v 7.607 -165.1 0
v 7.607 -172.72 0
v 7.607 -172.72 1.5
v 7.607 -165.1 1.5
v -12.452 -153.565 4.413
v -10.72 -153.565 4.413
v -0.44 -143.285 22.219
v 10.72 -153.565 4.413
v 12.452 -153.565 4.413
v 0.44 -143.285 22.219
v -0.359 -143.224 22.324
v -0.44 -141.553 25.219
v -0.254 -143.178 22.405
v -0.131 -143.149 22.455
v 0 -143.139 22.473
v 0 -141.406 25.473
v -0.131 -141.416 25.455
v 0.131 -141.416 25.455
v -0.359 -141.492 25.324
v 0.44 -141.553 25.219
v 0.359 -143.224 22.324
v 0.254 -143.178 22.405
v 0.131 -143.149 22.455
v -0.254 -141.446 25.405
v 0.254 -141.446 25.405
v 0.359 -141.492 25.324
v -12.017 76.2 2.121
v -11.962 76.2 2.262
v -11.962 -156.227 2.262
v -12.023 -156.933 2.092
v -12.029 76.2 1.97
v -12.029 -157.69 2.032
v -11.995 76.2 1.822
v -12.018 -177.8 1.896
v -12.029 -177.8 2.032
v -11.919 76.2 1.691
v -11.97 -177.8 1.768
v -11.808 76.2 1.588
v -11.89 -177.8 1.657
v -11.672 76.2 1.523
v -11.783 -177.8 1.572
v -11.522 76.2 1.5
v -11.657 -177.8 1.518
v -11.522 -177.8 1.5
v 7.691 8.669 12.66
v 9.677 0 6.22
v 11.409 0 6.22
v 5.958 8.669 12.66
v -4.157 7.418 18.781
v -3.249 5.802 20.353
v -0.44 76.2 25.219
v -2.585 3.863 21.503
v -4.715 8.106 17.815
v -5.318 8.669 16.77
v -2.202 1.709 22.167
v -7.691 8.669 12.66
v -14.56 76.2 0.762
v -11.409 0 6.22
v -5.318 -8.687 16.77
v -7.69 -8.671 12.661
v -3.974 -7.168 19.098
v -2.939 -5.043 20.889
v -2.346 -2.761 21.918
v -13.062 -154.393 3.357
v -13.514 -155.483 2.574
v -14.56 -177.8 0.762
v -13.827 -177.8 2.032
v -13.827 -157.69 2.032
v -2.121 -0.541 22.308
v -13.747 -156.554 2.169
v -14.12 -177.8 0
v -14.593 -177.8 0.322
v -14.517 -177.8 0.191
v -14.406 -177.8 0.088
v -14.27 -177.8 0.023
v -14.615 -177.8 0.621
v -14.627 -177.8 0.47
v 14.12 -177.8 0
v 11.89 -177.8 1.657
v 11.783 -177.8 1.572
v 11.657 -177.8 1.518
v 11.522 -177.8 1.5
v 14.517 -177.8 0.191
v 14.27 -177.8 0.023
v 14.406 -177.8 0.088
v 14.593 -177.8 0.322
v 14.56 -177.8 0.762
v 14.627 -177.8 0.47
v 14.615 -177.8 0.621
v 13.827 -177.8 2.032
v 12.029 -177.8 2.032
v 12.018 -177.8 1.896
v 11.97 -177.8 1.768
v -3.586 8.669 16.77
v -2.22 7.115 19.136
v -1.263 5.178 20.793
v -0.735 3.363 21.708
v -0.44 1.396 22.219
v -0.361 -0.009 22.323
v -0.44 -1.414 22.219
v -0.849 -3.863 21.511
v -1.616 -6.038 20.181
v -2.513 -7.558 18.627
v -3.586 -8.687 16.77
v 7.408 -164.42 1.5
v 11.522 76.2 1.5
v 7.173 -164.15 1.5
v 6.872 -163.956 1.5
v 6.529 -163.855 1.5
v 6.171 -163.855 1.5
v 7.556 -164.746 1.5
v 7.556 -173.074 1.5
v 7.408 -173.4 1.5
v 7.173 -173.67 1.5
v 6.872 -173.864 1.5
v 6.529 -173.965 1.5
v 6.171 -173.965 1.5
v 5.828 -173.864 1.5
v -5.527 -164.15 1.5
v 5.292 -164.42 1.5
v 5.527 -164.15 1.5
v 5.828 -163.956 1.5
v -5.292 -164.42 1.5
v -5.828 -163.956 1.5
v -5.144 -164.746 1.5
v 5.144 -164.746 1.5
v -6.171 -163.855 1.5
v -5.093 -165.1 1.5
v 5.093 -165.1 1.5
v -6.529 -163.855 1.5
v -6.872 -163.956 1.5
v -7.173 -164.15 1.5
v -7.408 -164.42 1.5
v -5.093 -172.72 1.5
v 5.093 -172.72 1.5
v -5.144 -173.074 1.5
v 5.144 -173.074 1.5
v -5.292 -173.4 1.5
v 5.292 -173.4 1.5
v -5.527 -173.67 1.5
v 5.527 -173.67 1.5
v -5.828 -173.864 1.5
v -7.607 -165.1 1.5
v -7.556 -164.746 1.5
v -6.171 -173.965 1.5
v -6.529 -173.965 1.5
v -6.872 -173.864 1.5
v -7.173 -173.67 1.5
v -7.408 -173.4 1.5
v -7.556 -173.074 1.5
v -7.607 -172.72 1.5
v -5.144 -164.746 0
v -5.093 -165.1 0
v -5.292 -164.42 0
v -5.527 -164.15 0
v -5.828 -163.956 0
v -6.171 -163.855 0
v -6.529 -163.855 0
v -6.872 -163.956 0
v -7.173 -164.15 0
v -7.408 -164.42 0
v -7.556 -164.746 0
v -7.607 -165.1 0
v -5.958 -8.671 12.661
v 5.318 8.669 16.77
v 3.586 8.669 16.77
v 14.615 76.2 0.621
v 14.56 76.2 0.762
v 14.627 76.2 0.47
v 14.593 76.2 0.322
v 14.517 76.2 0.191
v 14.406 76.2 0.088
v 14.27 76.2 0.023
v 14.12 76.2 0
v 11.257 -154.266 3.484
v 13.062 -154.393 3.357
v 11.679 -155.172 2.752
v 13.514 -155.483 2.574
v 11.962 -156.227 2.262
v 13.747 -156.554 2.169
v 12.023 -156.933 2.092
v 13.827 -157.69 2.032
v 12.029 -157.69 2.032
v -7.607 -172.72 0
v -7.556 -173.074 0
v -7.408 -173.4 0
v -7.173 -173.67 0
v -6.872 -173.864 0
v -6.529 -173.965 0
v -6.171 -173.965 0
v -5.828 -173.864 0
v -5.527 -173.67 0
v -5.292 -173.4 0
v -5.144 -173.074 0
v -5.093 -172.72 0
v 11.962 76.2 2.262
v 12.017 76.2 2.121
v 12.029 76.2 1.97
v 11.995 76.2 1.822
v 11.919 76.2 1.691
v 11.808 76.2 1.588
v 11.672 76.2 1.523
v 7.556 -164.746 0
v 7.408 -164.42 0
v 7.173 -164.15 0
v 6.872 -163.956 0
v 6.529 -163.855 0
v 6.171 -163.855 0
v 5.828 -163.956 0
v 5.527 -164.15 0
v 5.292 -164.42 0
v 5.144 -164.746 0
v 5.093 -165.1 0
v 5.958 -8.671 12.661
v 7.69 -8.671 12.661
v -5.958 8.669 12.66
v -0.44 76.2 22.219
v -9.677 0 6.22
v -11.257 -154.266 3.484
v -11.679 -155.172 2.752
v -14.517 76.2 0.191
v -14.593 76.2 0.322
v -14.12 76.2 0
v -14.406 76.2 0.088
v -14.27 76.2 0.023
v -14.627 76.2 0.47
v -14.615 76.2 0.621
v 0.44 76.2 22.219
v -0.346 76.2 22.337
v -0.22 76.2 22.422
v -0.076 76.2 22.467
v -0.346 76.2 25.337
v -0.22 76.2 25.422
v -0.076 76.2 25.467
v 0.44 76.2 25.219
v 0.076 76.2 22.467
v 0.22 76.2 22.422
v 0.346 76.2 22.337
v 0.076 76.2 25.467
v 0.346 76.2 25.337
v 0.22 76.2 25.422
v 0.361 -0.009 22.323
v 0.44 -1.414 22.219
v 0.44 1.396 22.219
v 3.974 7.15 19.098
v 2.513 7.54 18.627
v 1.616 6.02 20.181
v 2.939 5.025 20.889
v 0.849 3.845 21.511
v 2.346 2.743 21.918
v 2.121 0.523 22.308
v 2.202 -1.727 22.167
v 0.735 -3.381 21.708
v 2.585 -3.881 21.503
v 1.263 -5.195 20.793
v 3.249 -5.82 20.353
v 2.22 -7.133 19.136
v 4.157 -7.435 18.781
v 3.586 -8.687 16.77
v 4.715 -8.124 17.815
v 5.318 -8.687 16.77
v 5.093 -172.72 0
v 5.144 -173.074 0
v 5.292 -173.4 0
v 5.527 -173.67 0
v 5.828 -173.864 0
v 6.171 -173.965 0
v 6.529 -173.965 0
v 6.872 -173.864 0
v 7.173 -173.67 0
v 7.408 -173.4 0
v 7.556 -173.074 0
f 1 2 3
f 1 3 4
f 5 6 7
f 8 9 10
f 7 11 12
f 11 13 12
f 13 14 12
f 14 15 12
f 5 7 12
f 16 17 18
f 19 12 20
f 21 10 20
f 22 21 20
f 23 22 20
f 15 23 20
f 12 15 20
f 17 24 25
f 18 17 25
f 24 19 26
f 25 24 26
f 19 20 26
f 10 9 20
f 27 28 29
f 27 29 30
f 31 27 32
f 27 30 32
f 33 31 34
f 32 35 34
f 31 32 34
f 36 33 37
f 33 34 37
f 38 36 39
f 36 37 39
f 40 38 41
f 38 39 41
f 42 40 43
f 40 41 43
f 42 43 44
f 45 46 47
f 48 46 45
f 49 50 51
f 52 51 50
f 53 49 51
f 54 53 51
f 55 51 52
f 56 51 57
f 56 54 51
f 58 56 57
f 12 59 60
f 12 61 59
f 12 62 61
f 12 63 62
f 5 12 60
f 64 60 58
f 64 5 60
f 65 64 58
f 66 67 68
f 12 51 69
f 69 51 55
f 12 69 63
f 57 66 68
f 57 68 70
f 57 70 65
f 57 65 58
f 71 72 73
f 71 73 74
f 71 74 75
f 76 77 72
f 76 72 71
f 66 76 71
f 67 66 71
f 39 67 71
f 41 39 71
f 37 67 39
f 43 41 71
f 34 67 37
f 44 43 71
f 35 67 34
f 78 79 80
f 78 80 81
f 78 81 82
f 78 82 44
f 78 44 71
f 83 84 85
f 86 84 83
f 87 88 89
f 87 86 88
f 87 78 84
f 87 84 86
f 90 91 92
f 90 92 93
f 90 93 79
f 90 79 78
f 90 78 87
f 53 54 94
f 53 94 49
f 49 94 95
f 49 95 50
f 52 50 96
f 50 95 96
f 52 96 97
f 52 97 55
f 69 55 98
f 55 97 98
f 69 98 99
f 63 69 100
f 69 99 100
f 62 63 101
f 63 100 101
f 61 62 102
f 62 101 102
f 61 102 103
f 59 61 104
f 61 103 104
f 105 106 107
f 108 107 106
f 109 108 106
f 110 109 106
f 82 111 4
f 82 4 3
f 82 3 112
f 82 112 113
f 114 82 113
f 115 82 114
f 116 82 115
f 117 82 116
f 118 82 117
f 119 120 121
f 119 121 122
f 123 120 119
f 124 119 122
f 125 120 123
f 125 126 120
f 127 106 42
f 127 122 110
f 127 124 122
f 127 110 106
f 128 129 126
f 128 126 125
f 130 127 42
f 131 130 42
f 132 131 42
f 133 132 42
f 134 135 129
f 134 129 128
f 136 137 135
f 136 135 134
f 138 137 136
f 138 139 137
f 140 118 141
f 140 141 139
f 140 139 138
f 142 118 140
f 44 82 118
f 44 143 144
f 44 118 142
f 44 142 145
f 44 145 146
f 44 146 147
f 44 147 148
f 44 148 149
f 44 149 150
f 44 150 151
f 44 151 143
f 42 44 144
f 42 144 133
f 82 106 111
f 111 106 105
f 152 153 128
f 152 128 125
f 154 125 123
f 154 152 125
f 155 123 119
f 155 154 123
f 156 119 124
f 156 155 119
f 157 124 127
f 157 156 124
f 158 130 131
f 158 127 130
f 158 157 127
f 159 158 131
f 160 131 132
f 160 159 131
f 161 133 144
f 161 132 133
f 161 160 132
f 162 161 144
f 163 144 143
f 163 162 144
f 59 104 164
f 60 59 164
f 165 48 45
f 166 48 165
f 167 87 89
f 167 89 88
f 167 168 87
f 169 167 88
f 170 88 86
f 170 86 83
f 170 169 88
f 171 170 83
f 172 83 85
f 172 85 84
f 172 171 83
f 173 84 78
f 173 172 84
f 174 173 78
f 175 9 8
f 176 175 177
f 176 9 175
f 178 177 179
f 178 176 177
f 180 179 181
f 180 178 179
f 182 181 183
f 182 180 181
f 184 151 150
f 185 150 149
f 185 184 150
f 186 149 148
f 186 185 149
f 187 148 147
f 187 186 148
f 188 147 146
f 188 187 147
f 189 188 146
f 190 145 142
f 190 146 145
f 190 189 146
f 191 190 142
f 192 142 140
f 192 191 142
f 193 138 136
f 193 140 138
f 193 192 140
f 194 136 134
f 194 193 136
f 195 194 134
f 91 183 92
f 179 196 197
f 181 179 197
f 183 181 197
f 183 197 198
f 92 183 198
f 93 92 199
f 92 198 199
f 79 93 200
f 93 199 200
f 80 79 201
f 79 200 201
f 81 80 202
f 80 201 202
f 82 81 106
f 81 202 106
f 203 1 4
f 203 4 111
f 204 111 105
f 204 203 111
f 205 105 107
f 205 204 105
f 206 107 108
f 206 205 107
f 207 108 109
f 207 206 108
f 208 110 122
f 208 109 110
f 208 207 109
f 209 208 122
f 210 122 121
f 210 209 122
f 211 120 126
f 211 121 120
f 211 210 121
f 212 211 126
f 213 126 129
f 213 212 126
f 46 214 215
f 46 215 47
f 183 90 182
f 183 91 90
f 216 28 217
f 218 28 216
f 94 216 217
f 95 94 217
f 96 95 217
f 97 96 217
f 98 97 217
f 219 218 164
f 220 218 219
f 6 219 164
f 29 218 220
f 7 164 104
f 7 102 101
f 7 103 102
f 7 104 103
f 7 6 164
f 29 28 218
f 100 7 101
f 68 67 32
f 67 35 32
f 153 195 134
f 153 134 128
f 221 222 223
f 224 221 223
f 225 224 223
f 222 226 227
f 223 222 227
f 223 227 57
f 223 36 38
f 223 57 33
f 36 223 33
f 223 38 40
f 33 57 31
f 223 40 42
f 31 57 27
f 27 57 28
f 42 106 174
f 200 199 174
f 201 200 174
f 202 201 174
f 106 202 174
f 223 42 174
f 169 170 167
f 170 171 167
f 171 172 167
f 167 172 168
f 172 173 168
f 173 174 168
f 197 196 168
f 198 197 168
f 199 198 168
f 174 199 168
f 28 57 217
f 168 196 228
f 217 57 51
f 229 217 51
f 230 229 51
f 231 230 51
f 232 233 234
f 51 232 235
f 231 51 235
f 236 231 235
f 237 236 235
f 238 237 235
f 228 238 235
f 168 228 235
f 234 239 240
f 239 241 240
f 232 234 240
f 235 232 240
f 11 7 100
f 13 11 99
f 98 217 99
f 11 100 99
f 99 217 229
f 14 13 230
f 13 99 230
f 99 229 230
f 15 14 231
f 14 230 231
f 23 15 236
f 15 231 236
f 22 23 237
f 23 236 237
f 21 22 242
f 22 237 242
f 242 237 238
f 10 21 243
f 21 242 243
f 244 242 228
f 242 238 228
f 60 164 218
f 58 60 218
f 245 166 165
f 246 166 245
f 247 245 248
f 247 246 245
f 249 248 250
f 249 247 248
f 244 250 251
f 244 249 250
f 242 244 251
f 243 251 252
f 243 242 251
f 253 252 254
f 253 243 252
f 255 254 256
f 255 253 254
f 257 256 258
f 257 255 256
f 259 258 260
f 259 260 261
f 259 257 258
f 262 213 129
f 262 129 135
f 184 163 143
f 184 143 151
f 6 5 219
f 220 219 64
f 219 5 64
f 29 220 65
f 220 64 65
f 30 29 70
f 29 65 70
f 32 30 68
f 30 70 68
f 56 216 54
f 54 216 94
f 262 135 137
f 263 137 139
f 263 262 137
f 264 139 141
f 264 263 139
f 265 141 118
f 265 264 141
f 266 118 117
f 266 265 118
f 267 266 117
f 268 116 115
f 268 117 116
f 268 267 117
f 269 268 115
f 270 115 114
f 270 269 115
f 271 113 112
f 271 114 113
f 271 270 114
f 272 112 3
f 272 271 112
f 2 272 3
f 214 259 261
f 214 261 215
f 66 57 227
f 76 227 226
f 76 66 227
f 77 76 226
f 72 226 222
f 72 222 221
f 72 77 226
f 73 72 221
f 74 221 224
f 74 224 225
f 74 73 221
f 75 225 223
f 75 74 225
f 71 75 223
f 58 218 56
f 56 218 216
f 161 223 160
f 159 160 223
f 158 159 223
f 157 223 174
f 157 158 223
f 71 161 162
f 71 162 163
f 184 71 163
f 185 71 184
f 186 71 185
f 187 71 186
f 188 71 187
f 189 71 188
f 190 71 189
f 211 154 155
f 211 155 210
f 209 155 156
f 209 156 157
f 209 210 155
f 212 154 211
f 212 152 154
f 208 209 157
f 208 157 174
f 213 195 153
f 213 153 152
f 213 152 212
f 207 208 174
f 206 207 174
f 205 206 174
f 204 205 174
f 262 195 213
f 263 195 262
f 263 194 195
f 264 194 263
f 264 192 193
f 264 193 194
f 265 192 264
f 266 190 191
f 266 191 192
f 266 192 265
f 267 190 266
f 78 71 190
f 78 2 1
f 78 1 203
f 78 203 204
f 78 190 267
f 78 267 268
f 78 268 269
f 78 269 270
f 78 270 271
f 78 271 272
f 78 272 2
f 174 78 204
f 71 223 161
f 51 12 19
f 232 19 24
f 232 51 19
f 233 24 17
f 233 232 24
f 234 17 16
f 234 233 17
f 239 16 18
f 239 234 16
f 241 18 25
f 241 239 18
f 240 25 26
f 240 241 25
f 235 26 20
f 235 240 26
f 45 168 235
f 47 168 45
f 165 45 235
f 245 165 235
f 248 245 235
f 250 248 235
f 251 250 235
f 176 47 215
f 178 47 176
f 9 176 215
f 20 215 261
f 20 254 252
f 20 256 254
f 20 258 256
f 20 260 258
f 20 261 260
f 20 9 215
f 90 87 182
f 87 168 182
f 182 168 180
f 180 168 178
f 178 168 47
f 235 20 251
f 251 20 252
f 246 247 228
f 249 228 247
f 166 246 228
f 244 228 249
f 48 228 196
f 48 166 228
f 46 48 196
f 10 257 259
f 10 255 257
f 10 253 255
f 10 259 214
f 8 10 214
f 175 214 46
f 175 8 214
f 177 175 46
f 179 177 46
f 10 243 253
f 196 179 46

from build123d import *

# Parameters (mm, degrees)
F1_DEPTH      = 177.8
F1_DEPTH_BACK = 76.2
F2_R          = 0.508
F4_DEPTH      = 14.6291181898
F4_DEPTH_BACK = 14.6291181898
F6_DEPTH      = 25.4737621135
F8_DEPTH      = 14.6291181898
F8_DEPTH_BACK = 14.6291181898
F9_R          = 4.7625


with BuildPart() as f1:
    # F0 (on Front) → F1 (new body, two sides)
    with BuildSketch(Plane.XZ) as f1_sk:
        Polygon((0, 25.9807621135), (-15, 0), (15, 0), align=None)
        Polygon((-12.4019237886, 1.5), (0, 22.9807621135), (12.4019237886, 1.5), align=None, mode=Mode.SUBTRACT)
    extrude(amount=F1_DEPTH)
    extrude(f1_sk.sketch, amount=-F1_DEPTH_BACK)

    # F2
    f2_edges = [f1.edges().sort_by_distance(p)[0] for p in [
        (0, -50.8, 25.980762),
        (15, -50.8, 0),
        (-15, -50.8, 0),
        (-12.401924, -50.8, 1.5),
        (0, -50.8, 22.980762),
        (12.401924, -50.8, 1.5),
    ]]
    fillet(f2_edges, radius=F2_R)

    # F3 (on Right) → F4 (cut, two sides)
    with BuildSketch(Plane.YZ) as f4_sk:
        with BuildLine():
            Line((-8.6871078238, 16.7701914907), (-8.6706578732, 12.6613909379))
            Line((-8.6706578732, 12.6613909379), (0, 6.2201358425))
            Line((0, 6.2201358425), (8.6693109221, 12.6603903153))
            Line((8.6693109221, 12.6603903153), (8.6693109221, 16.7701914907))
            ThreePointArc((8.6693109221, 16.7701914907), (-0.0088984509, 22.3225436807), (-8.6871078238, 16.7701914907))
        make_face()
    extrude(amount=-F4_DEPTH, mode=Mode.SUBTRACT)
    extrude(f4_sk.sketch, amount=F4_DEPTH_BACK, mode=Mode.SUBTRACT)

    # F5 (on Top) → F6 (cut, through all)
    with BuildSketch(Plane.XY):
        with BuildLine():
            Line((-5.0927, -172.72), (-5.0927, -165.1))
            ThreePointArc((-5.0927, -165.1), (-6.35, -163.8427), (-7.6073, -165.1))
            Line((-7.6073, -165.1), (-7.6073, -172.72))
            ThreePointArc((-7.6073, -172.72), (-6.35, -173.9773), (-5.0927, -172.72))
        make_face()
        with BuildLine():
            ThreePointArc((7.6073, -165.1), (6.35, -163.8427), (5.0927, -165.1))
            Line((5.0927, -165.1), (5.0927, -172.72))
            ThreePointArc((5.0927, -172.72), (6.35, -173.9773), (7.6073, -172.72))
            Line((7.6073, -172.72), (7.6073, -165.1))
        make_face()
    extrude(amount=F6_DEPTH, mode=Mode.SUBTRACT)

    # F7 (on Right) → F8 (cut, two sides)
    with BuildSketch(Plane.YZ) as f8_sk:
        Polygon((-204.1564583778, 33.782), (-205.74, 2.032), (-154.94, 2.032), (-136.6091289532, 33.782), align=None)
    extrude(amount=-F8_DEPTH, mode=Mode.SUBTRACT)
    extrude(f8_sk.sketch, amount=F8_DEPTH_BACK, mode=Mode.SUBTRACT)

    # F9
    f9_edges = [f1.edges().sort_by_distance(p)[0] for p in [
        (12.928149, -154.94, 2.032),
        (-12.928149, -154.94, 2.032),
    ]]
    fillet(f9_edges, radius=F9_R)


solid = f1.part
